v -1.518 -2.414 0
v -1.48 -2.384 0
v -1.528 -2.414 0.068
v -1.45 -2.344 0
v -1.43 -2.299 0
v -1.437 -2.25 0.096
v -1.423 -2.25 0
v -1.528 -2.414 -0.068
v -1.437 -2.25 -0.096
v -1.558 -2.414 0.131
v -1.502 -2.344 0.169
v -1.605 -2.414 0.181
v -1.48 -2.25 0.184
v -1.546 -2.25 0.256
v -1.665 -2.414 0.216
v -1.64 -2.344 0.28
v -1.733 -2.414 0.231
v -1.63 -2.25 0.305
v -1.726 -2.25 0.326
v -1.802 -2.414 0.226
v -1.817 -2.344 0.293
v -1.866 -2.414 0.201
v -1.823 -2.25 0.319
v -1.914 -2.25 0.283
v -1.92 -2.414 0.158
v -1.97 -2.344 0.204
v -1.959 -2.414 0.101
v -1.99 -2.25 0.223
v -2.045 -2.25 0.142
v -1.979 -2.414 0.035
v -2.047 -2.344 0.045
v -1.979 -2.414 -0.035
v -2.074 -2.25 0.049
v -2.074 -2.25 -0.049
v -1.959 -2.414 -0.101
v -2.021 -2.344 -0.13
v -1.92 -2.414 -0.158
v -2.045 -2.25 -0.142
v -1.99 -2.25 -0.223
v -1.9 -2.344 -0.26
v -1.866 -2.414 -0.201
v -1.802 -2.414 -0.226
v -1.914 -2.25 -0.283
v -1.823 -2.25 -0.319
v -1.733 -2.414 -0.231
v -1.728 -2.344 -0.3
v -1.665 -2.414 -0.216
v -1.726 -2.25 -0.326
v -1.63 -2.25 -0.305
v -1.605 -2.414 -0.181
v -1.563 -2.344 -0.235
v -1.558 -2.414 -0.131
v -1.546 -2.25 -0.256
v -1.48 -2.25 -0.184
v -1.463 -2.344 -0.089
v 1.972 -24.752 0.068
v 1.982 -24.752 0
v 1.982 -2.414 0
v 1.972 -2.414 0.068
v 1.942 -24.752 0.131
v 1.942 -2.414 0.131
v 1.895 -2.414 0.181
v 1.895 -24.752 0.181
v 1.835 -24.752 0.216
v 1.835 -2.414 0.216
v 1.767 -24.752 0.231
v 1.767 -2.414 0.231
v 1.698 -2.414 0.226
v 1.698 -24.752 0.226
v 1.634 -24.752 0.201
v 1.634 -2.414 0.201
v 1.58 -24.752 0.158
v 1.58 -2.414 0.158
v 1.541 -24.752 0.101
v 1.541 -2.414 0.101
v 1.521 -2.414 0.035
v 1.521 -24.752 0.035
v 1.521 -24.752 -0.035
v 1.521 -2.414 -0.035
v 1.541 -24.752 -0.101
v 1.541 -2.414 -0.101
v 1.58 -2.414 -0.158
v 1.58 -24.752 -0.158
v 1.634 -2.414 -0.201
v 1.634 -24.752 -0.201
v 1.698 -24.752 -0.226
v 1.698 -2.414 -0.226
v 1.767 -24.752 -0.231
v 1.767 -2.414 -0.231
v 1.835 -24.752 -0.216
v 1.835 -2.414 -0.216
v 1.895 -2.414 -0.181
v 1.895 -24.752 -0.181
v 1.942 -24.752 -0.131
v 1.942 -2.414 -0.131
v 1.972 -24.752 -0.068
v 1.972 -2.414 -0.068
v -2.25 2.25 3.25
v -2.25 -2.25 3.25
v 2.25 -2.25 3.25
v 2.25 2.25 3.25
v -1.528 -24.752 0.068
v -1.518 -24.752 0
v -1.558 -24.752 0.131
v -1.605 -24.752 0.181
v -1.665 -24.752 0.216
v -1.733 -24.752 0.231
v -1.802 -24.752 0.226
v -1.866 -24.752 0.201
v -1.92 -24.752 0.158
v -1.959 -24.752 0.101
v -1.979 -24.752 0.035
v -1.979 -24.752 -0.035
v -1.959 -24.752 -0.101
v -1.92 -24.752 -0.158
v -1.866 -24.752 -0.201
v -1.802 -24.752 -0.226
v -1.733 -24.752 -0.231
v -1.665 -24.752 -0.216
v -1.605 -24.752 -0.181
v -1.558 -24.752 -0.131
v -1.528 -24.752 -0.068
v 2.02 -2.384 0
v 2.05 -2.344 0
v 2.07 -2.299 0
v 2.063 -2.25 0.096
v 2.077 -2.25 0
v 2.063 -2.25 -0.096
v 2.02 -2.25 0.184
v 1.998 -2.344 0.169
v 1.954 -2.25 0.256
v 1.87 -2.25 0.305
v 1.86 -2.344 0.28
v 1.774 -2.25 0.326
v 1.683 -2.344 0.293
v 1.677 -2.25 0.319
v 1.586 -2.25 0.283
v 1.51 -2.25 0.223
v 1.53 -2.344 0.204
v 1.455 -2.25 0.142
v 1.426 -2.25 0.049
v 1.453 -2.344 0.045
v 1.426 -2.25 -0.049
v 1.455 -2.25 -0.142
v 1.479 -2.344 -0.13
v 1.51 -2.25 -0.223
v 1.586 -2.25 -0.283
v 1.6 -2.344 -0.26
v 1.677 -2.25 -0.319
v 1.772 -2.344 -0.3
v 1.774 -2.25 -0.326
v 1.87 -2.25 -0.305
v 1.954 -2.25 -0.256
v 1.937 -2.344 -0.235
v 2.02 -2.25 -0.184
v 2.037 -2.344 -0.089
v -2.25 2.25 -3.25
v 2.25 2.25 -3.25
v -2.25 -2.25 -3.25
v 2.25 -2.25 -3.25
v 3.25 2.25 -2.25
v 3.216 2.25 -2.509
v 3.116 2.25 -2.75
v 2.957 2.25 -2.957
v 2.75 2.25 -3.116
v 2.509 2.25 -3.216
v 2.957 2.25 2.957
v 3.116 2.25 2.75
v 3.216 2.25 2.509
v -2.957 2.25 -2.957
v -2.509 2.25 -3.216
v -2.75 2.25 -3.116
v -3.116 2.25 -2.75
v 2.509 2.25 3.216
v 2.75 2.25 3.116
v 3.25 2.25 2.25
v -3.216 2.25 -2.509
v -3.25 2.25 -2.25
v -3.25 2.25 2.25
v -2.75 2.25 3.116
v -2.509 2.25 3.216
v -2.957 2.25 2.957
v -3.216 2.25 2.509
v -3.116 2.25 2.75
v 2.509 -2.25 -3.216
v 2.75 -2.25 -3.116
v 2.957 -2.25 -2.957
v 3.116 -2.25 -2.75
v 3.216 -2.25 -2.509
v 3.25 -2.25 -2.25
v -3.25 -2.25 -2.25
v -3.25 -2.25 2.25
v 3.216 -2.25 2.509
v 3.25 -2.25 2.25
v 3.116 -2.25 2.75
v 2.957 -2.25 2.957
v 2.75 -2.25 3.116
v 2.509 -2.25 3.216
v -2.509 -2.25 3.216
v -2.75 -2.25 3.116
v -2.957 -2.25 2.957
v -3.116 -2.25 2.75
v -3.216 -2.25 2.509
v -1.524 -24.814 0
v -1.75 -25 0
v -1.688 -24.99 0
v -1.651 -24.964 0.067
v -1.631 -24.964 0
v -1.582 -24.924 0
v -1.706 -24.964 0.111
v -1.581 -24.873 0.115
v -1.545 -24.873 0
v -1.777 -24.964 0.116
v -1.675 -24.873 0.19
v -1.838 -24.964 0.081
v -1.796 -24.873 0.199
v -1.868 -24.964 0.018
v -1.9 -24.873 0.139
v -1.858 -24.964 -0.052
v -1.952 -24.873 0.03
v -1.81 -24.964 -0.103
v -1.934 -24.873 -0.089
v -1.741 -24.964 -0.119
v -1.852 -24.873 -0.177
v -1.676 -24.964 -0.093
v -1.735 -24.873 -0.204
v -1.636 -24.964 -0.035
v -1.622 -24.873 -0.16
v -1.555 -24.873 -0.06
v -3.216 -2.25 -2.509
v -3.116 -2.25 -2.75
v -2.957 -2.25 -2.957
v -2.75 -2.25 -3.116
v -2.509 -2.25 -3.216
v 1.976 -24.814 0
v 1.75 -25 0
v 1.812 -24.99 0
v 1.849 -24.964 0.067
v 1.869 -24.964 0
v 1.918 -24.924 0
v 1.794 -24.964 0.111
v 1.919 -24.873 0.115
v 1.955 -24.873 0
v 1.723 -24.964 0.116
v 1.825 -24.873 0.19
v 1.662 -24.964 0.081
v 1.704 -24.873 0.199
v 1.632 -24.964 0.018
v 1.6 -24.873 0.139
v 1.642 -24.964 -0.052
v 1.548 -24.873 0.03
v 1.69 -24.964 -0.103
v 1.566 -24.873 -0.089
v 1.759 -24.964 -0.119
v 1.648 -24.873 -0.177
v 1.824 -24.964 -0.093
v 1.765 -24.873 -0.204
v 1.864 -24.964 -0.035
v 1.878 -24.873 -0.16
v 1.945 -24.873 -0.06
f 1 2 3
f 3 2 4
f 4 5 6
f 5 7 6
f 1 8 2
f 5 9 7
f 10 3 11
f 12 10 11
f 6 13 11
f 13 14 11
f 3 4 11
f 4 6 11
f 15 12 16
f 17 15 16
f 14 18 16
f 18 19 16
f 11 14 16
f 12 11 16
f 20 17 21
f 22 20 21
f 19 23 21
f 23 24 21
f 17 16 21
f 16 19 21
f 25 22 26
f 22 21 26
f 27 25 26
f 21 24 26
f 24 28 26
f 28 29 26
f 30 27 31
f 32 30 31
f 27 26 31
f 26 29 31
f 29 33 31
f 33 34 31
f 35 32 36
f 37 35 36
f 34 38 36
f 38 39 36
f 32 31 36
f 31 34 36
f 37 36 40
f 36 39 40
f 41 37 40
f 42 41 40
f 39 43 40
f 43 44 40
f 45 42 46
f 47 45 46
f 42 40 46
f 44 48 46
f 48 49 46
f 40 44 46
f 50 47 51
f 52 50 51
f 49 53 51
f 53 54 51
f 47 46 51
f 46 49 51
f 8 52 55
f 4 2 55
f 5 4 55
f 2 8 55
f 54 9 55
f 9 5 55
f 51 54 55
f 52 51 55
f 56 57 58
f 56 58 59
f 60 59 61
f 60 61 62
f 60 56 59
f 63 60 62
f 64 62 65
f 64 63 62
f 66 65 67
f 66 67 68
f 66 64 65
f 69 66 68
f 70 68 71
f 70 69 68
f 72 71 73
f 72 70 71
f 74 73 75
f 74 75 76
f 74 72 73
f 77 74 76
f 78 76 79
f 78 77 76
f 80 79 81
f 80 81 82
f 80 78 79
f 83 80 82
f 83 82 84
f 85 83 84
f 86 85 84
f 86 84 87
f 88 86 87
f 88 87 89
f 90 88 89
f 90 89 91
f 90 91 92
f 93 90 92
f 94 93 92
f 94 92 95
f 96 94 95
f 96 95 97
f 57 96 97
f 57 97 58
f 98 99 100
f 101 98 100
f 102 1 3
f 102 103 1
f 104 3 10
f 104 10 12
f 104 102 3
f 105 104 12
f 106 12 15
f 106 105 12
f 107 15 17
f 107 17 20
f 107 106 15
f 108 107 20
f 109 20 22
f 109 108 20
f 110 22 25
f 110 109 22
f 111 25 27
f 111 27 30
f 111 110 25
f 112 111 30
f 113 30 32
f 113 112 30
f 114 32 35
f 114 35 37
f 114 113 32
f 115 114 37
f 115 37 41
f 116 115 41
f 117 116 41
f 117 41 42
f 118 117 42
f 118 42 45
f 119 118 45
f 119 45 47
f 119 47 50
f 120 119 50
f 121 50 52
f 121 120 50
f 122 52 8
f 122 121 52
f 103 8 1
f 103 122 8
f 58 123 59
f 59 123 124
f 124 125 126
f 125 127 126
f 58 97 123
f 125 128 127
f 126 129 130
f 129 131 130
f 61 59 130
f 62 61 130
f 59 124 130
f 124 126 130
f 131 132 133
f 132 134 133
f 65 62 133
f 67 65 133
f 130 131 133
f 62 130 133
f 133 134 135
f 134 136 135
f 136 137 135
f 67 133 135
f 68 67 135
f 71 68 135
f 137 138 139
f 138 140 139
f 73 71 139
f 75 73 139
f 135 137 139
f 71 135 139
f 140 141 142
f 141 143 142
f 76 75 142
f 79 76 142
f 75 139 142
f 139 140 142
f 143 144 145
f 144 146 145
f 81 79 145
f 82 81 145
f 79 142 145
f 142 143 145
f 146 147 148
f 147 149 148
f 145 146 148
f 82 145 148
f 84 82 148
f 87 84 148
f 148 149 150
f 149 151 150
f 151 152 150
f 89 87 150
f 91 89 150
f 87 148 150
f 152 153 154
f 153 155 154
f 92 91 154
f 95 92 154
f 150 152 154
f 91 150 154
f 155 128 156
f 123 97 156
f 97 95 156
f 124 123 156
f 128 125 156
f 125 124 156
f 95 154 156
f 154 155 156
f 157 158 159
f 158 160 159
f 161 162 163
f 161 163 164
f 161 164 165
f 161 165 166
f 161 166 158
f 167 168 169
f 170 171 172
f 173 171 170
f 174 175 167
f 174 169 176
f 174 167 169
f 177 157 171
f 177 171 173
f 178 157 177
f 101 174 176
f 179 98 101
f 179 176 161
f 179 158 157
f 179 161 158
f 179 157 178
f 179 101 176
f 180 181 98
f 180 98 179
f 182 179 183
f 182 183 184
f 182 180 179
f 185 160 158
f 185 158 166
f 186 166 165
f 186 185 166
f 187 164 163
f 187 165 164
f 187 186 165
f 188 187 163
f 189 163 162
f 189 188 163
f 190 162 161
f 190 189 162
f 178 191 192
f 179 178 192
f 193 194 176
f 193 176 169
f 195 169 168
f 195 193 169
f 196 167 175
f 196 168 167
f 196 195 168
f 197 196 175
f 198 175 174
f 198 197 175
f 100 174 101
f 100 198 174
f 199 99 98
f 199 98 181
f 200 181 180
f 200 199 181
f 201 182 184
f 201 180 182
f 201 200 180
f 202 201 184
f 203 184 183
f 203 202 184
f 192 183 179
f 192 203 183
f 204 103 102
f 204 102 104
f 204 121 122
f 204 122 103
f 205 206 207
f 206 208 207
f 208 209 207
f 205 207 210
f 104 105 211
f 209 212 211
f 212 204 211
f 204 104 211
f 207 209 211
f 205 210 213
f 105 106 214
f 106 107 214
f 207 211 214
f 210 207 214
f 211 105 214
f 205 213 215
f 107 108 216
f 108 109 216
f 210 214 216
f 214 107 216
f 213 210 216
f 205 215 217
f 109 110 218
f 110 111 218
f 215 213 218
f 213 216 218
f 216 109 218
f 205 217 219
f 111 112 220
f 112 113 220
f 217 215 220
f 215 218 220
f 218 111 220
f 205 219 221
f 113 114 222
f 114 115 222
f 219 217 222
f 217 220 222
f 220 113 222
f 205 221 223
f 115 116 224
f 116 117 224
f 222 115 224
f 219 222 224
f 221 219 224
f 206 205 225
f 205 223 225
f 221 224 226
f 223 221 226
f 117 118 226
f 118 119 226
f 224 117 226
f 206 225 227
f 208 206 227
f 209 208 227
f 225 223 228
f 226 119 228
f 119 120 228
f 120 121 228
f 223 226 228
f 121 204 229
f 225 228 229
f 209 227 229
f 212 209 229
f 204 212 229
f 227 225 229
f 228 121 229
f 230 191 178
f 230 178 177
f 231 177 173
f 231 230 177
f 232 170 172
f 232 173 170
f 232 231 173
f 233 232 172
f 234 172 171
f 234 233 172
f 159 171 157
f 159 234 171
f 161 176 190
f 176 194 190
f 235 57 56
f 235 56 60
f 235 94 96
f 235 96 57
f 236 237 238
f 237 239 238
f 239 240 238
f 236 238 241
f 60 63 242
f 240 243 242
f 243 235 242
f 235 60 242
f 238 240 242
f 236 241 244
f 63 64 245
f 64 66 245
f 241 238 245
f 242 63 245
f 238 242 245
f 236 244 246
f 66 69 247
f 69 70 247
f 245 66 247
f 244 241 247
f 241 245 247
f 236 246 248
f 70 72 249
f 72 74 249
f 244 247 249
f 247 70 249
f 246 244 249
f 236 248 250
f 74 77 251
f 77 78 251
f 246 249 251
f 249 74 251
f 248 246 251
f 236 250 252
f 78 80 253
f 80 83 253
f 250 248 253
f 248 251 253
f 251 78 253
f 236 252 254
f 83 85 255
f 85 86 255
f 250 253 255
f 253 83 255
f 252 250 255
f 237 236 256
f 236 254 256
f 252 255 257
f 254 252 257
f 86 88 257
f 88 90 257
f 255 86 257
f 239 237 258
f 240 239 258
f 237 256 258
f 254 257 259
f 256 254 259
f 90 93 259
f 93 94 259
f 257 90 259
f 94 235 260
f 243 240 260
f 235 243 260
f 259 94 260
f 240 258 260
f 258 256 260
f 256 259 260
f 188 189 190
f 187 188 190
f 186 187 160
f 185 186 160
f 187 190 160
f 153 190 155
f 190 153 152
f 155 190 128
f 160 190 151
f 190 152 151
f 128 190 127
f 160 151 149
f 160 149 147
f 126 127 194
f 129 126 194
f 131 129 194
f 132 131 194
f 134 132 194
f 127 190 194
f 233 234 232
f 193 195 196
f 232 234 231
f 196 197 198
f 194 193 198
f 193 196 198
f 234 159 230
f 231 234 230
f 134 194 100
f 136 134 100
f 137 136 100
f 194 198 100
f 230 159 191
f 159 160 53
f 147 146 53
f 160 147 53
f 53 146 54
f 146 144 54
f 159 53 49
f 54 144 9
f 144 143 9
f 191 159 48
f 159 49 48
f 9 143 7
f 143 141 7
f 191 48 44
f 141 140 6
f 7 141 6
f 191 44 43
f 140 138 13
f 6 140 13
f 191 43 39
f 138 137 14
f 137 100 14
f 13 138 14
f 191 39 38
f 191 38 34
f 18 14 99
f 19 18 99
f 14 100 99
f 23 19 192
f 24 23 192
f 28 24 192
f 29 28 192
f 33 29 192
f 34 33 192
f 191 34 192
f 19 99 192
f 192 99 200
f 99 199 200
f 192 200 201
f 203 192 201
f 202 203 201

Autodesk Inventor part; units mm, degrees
ref_plane "YZ Plane" through (0, 0, 0) normal (1, 0, 0) x (0, 1, 0)
ref_plane "XZ Plane" through (0, 0, 0) normal (0, 1, 0) x (-1, 0, 0)
ref_plane "XY Plane" through (0, 0, 0) normal (0, 0, 1) x (1, 0, 0)
sketch "Sketch1" plane through (0, 0, 0) normal (0, 1, 0) x (-1, 0, 0)
  line L0 (2.25, 3.25) -> (-2.25, 3.25)
  line L1 (-3.25, 2.25) -> (-3.25, -2.25)
  line L2 (-2.25, -3.25) -> (2.25, -3.25)
  line L3 (3.25, -2.25) -> (3.25, 2.25)
  line L4 (3.25, 3.25) -> (-3.25, -3.25) construction
  line L5 (-3.25, 3.25) -> (3.25, -3.25) construction
  arc A0 (-3.25, -2.25) -> (-2.25, -3.25) centre (-2.25, -2.25) ccw
  arc A1 (2.25, -3.25) -> (3.25, -2.25) centre (2.25, -2.25) ccw
  arc A2 (3.25, 2.25) -> (2.25, 3.25) centre (2.25, 2.25) ccw
  arc A3 (-2.25, 3.25) -> (-3.25, 2.25) centre (-2.25, 2.25) ccw
  point P0 (0, 0)
  dimension "d0" = 6.5
  dimension "d1" = 6.5
  dimension "d4" = 1
extrude "Extrusion1" add sketch "Sketch1" along normal mid plane 4.5
sketch "Sketch4" plane through (0, 0, 0) normal (0, 0, 1) x (1, 0, 0)
  arc A0 (-1.75, -25) -> (-1.5182, -24.7516) centre (-1.7559, -24.7621) ccw
  line L0 (-1.75, -2.4144) -> (-1.75, -25)
  line L1 (-1.5182, -2.4144) -> (-1.5182, -24.7516)
  arc A1 (-1.5182, -2.4144) -> (-1.4227, -2.25) centre (-1.6226, -2.2437) ccw
  line L2 (-1.75, -2.4144) -> (-1.75, -2.25)
  line L3 (-1.75, -2.25) -> (-1.4227, -2.25)
  point P0 (0, 0)
  dimension "d27" = 0.2
revolve "Revolution2" add sketch "Sketch4" angle 360 about axis through (-1.75, -2.4144, 0) along (0, -1, 0)
pattern_linear "Rectangular Pattern4" count 2 spacing 3.5 along (1, 0, 0) of "Revolution2"
properties part number "A54"
